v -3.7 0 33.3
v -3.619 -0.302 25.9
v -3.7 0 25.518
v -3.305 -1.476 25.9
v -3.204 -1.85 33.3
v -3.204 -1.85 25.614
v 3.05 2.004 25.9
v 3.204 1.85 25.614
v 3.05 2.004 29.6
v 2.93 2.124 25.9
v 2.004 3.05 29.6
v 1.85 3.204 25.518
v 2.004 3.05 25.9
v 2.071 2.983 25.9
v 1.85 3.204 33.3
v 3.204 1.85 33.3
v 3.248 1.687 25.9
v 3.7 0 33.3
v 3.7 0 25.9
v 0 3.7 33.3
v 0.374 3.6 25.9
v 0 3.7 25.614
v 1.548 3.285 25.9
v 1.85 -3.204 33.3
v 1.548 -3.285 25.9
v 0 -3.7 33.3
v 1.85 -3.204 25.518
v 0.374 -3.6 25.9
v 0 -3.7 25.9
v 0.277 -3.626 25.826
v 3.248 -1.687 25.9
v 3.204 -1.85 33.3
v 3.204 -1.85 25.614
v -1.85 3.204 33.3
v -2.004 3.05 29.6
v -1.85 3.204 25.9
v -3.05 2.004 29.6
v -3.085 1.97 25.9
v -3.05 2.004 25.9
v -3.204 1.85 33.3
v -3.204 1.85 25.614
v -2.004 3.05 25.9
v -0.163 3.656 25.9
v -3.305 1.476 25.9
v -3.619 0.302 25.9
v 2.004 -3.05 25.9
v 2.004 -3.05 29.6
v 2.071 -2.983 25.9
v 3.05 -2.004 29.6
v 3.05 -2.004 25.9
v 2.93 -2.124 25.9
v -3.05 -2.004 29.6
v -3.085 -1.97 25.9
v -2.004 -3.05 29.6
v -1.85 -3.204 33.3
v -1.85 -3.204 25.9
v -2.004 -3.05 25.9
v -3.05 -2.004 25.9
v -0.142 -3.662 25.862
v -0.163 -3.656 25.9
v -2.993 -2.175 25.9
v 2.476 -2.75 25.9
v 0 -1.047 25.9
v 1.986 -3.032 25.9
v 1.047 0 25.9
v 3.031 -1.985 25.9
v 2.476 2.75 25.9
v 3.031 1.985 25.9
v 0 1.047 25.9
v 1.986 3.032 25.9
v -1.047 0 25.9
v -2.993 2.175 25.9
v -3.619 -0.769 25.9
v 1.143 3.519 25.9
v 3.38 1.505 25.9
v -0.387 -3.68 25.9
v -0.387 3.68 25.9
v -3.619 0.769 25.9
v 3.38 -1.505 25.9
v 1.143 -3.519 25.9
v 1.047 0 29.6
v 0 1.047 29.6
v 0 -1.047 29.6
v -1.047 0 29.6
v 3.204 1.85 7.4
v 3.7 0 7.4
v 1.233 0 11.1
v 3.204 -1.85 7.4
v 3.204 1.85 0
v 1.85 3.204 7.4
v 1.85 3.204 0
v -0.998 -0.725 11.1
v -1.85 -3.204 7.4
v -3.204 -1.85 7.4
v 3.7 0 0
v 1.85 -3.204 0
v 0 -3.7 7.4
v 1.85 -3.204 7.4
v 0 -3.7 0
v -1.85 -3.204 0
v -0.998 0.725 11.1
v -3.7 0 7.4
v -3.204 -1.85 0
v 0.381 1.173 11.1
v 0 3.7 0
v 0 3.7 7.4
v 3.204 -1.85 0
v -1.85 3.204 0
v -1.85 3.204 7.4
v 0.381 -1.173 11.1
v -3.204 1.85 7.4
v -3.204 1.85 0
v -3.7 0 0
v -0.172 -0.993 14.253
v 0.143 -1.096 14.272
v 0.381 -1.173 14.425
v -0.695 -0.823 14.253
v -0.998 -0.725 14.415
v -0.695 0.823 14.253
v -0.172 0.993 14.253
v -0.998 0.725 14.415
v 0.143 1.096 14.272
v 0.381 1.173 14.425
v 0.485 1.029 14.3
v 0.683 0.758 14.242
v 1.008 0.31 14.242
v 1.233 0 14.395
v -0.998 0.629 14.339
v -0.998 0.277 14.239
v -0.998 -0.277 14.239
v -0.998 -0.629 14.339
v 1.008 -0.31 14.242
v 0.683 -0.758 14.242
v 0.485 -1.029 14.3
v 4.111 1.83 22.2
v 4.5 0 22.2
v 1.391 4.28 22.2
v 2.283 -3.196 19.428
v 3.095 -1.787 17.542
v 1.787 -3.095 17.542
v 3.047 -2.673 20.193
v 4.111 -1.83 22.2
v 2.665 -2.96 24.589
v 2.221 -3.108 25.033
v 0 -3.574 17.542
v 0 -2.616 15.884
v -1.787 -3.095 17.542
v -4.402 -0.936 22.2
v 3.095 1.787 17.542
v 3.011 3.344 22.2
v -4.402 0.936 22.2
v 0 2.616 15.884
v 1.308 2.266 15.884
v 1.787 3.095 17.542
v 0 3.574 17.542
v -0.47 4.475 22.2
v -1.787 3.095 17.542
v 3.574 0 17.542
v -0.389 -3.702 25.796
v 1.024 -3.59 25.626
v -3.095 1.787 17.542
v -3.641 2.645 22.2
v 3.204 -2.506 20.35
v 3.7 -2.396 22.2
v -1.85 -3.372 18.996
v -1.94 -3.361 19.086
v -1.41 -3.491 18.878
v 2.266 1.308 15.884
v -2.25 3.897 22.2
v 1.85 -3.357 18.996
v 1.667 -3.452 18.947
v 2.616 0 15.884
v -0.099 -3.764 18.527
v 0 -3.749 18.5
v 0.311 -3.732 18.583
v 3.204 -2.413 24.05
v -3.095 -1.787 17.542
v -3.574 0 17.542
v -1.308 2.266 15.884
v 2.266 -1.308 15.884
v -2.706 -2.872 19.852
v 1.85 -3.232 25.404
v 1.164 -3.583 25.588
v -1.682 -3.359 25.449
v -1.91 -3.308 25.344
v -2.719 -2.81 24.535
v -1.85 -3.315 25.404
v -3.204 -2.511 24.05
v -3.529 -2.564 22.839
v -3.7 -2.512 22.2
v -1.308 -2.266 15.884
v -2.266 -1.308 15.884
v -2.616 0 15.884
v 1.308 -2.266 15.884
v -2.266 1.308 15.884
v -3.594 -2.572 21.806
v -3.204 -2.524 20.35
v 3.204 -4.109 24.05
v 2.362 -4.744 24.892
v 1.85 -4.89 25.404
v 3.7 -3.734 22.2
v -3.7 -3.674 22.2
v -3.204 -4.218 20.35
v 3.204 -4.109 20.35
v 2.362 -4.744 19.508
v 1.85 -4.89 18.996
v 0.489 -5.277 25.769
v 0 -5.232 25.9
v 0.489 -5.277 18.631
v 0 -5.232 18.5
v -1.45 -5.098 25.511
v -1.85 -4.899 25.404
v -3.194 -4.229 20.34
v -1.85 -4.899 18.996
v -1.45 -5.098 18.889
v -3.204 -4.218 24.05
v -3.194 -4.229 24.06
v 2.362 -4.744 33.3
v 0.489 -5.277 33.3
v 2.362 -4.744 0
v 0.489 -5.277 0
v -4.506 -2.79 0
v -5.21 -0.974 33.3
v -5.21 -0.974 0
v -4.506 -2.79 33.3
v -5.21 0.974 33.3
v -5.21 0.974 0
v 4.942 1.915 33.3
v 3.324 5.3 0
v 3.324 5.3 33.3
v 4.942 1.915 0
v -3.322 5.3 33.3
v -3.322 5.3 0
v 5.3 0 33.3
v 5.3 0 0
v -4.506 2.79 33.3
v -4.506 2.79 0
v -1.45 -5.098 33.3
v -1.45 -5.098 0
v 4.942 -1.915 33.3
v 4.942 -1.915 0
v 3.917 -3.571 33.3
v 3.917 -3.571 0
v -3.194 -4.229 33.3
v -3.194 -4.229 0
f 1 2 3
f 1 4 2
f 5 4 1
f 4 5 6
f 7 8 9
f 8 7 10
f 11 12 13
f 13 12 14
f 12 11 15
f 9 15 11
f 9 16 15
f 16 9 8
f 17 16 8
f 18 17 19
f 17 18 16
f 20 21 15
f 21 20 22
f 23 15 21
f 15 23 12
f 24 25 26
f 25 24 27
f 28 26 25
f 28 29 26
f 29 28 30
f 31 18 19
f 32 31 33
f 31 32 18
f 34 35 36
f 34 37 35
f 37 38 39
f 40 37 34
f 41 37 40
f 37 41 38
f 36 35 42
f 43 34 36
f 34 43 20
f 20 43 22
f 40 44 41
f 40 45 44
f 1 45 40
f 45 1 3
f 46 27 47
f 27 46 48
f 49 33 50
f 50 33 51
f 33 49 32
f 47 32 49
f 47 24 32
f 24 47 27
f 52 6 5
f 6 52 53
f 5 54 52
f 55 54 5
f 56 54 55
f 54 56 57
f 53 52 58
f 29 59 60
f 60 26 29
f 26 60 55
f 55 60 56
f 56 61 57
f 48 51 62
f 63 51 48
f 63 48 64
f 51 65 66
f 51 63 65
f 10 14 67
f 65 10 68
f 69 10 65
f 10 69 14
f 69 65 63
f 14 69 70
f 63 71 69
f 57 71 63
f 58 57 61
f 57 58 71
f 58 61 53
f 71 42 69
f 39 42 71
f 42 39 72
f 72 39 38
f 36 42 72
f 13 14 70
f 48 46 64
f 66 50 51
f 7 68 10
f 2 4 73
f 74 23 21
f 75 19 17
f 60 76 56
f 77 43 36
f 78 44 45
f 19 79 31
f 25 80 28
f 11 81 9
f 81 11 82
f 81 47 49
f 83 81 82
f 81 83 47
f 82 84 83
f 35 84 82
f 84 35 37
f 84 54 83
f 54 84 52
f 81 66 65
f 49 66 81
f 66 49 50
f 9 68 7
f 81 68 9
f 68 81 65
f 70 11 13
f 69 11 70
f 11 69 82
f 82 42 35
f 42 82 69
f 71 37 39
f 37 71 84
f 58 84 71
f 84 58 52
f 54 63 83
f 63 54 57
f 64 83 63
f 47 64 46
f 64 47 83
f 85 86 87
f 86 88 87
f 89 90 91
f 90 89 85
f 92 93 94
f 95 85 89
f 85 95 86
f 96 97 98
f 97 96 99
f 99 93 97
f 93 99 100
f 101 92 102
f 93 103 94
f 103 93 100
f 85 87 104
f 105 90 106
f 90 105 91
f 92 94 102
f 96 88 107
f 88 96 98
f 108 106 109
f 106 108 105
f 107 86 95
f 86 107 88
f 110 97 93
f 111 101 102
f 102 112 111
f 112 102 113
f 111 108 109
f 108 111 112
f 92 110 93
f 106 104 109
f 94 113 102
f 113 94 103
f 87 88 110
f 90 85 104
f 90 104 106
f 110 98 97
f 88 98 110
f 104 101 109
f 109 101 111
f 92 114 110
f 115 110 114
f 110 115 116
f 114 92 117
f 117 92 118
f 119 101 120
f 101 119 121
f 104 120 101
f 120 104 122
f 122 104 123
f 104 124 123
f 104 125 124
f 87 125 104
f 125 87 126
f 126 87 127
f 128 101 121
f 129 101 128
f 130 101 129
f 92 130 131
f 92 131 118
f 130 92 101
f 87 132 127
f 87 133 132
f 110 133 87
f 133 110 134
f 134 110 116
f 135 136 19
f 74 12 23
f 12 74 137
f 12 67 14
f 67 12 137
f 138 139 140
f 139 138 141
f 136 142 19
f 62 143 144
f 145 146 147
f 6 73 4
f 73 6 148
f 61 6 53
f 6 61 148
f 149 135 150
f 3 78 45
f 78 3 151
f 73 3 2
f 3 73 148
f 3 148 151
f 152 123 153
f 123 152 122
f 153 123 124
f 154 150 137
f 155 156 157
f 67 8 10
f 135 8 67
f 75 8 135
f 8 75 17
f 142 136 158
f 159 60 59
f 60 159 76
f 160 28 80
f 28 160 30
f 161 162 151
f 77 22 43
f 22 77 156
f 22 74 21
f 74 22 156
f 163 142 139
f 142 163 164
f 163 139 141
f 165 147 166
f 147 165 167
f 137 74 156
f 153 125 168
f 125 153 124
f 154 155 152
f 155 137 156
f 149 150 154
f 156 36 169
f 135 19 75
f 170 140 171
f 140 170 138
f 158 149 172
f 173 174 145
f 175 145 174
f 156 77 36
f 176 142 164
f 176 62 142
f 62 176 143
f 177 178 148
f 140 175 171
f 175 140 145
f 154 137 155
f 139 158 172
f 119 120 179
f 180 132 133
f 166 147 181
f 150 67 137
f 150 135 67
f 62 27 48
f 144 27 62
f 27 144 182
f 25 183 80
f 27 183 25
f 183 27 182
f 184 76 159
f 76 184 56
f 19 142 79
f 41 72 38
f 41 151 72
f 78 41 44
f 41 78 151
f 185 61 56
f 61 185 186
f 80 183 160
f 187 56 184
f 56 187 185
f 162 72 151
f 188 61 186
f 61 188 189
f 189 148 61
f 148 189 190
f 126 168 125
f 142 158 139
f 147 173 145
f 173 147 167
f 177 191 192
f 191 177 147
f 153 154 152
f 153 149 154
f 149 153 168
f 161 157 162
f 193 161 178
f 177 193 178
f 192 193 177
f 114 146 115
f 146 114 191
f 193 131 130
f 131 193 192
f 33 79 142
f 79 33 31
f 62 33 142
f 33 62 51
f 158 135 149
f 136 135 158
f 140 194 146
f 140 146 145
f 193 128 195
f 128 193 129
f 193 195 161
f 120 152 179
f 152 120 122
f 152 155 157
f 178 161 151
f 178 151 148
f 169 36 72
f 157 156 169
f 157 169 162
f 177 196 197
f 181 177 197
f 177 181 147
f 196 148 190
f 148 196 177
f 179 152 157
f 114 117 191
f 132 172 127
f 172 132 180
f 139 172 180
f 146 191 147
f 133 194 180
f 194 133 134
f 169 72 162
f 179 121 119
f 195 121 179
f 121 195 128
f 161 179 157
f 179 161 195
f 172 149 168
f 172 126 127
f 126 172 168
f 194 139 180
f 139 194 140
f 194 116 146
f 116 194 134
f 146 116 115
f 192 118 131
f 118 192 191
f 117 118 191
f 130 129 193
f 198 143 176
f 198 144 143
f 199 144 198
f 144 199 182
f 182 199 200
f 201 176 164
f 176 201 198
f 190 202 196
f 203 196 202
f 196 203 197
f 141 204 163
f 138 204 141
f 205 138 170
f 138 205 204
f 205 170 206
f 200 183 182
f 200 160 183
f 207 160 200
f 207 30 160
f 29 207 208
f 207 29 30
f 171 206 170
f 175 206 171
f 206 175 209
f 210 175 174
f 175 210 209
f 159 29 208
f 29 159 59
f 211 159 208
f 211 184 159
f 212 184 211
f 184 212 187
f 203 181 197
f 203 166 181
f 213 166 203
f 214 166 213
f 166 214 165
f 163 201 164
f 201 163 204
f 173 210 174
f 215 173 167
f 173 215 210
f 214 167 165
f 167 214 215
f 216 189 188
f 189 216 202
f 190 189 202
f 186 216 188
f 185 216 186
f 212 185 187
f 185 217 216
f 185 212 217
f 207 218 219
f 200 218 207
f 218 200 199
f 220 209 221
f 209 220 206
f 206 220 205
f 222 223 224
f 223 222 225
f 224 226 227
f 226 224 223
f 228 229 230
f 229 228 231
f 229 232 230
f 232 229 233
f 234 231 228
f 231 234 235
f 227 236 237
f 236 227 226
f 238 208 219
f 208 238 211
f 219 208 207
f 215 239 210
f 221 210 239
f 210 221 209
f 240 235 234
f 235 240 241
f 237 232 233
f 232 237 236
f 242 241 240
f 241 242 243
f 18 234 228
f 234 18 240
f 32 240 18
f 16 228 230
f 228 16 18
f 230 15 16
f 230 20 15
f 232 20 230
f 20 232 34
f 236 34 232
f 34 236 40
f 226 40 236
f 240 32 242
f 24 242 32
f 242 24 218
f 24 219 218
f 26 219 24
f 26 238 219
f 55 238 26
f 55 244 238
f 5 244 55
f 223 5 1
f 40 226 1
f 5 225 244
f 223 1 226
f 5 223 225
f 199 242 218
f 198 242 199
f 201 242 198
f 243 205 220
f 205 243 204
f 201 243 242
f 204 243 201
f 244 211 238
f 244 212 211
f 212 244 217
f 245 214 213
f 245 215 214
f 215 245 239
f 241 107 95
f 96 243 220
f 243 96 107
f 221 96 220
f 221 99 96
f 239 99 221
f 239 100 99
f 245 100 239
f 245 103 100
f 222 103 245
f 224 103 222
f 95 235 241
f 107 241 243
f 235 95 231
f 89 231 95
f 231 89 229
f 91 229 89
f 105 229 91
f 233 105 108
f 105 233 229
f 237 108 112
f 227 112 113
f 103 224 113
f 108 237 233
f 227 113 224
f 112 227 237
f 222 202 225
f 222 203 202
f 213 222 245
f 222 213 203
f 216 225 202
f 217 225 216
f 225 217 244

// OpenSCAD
br=3.7;
t=1.6;
ri=-1;

module cut(feed_hole=true)
{  
    ri= (ri<0 ? br/3 : ri);
    hull()
    {   translate([0,0,-br]) cylinder(r=br,h=3*br); //Bottom hole.
        cylinder(r=ri,h=3*br); //Narrowing.
    }
    cylinder(r=ri,h=4*br); //Narrowing, ensure the visualization does it decently.
    hull()
    {   translate([0,0,4*br]) sphere(ri); //Ball, closing location.
        translate([0,0,5*br]) sphere(br); //Ball, closing location.
        translate([0,0,6*br]) cylinder(r1=br+t/2,r2=br,h=br); //to location of ball.
    }
    //Feeding the ball.
    if(feed_hole) translate([0,0,6*br]) rotate([90,0,0]) cylinder(r=br,h=8*br);
    difference()
    {   translate([0,0,6*br]) cylinder(r=br,h=8*br); //Top hole.
        //Grating to hold back ball.
        translate([0,0,7*br]) linear_extrude(height=br) for(a=[45,135]) rotate(a)
            square(br*[0.4,4],center=true);
    }
}
//Cover for feeding the ball.
module feed_hole_cover()
{   intersection()
    {   translate([0,0,5*br]) rotate([90,0,0]) cylinder(r=br,h=8*br);
        difference()
        {   cylinder(r=br+t,h=9*br);
            cut(t=t,br=br,feed_hole=false);
        }
    }
    intersection()
    {   translate([0,-br-t,5*br]) cube([br,br,3*br],center=true);
        cylinder(r=br+t,h=9*br);
    }
}

module outer_shape(br,t)
{   intersection()
    {   hull(){ circle(br+t); translate([0,br]) circle(br); }
        square((br+t)*[2,2],center=true);
    }
}

module slide2d()
{   difference()
    {   outer_shape(br+t/4,t+t/4);
        outer_shape(br+s,t+s);
    }
}
//Slides over the side.
module bb_slide_over()
{   linear_extrude(height=5*br) slide2d(t=t,br=br); 
}

module ball_check_valve(feed_hole=true)
{   difference()
    {   linear_extrude(height=9*br) outer_shape(br=br,t=t);
        cut(t=t,br=br,ri=ri,feed_hole=feed_hole);
    }
}
//translate([30,0]) slide_over();
ball_check_valve();
//cut();
//translate([0.1,0.1,0.1]) color("blue") feed_hole_cover();
